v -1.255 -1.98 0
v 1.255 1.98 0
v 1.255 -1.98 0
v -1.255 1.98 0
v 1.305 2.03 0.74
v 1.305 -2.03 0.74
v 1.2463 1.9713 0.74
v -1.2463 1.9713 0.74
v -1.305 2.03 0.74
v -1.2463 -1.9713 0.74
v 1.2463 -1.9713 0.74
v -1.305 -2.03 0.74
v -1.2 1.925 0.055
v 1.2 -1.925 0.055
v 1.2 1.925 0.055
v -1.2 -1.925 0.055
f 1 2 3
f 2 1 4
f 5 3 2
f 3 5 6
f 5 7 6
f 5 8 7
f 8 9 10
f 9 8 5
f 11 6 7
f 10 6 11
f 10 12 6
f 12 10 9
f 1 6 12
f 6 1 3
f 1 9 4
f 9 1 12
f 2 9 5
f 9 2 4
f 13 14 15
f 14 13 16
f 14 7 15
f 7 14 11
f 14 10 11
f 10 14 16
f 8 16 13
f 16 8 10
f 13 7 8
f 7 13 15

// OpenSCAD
/* Copyright 2017 Sam Hanes
 *
 * This documentation describes Open Hardware and is licensed under the
 * CERN Open Hardware License v1.2.
 *
 * You may redistribute and modify this documentation under the terms of
 * the CERN OHL v.1.2O. This documentation is distributed WITHOUT ANY
 * EXPRESS OR IMPLIED WARRANTY, INCLUDING OF MERCHANTABILITY, SATISFACTORY
 * QUALITY AND FITNESS FOR A PARTICULAR PURPOSE. Please see the CERN OHL
 * v1.2 for applicable conditions. You should have received a copy of the
 * OHL alonside this documentation in the file `LICENSE.txt`.
 */


module box(size, slope) {
  x = size[0] / 2;
  y = size[1] / 2;
  z = size[2];
  i = slope * z;

  polyhedron(
    points = [
      [-x + i, -y + i, 0], // 0
      [ x - i, -y + i, 0], // 1
      [ x - i,  y - i, 0], // 2
      [-x + i,  y - i, 0], // 3
      [-x,     -y,     z], // 4
      [ x,     -y,     z], // 5
      [ x,      y,     z], // 6
      [-x,      y,     z], // 7
    ],
    faces = [
      [0, 1, 2, 3],
      [4, 5, 1, 0],
      [7, 6, 5, 4],
      [5, 6, 2, 1],
      [6, 7, 3, 2],
      [7, 4, 0, 3],
    ]
  );
}

sizeX = 2.610;
sizeY = 4.060;
sizeZ = 0.740;

sizeX2 = 2.560;
thick = 0.055;

slope = (sizeX - sizeX2) / sizeZ;

difference() {
  box([sizeX, sizeY, sizeZ], slope);

  t2 = thick * 2;
  translate([0, 0, thick])
    box([sizeX - t2, sizeY - t2, sizeZ], slope);
}
